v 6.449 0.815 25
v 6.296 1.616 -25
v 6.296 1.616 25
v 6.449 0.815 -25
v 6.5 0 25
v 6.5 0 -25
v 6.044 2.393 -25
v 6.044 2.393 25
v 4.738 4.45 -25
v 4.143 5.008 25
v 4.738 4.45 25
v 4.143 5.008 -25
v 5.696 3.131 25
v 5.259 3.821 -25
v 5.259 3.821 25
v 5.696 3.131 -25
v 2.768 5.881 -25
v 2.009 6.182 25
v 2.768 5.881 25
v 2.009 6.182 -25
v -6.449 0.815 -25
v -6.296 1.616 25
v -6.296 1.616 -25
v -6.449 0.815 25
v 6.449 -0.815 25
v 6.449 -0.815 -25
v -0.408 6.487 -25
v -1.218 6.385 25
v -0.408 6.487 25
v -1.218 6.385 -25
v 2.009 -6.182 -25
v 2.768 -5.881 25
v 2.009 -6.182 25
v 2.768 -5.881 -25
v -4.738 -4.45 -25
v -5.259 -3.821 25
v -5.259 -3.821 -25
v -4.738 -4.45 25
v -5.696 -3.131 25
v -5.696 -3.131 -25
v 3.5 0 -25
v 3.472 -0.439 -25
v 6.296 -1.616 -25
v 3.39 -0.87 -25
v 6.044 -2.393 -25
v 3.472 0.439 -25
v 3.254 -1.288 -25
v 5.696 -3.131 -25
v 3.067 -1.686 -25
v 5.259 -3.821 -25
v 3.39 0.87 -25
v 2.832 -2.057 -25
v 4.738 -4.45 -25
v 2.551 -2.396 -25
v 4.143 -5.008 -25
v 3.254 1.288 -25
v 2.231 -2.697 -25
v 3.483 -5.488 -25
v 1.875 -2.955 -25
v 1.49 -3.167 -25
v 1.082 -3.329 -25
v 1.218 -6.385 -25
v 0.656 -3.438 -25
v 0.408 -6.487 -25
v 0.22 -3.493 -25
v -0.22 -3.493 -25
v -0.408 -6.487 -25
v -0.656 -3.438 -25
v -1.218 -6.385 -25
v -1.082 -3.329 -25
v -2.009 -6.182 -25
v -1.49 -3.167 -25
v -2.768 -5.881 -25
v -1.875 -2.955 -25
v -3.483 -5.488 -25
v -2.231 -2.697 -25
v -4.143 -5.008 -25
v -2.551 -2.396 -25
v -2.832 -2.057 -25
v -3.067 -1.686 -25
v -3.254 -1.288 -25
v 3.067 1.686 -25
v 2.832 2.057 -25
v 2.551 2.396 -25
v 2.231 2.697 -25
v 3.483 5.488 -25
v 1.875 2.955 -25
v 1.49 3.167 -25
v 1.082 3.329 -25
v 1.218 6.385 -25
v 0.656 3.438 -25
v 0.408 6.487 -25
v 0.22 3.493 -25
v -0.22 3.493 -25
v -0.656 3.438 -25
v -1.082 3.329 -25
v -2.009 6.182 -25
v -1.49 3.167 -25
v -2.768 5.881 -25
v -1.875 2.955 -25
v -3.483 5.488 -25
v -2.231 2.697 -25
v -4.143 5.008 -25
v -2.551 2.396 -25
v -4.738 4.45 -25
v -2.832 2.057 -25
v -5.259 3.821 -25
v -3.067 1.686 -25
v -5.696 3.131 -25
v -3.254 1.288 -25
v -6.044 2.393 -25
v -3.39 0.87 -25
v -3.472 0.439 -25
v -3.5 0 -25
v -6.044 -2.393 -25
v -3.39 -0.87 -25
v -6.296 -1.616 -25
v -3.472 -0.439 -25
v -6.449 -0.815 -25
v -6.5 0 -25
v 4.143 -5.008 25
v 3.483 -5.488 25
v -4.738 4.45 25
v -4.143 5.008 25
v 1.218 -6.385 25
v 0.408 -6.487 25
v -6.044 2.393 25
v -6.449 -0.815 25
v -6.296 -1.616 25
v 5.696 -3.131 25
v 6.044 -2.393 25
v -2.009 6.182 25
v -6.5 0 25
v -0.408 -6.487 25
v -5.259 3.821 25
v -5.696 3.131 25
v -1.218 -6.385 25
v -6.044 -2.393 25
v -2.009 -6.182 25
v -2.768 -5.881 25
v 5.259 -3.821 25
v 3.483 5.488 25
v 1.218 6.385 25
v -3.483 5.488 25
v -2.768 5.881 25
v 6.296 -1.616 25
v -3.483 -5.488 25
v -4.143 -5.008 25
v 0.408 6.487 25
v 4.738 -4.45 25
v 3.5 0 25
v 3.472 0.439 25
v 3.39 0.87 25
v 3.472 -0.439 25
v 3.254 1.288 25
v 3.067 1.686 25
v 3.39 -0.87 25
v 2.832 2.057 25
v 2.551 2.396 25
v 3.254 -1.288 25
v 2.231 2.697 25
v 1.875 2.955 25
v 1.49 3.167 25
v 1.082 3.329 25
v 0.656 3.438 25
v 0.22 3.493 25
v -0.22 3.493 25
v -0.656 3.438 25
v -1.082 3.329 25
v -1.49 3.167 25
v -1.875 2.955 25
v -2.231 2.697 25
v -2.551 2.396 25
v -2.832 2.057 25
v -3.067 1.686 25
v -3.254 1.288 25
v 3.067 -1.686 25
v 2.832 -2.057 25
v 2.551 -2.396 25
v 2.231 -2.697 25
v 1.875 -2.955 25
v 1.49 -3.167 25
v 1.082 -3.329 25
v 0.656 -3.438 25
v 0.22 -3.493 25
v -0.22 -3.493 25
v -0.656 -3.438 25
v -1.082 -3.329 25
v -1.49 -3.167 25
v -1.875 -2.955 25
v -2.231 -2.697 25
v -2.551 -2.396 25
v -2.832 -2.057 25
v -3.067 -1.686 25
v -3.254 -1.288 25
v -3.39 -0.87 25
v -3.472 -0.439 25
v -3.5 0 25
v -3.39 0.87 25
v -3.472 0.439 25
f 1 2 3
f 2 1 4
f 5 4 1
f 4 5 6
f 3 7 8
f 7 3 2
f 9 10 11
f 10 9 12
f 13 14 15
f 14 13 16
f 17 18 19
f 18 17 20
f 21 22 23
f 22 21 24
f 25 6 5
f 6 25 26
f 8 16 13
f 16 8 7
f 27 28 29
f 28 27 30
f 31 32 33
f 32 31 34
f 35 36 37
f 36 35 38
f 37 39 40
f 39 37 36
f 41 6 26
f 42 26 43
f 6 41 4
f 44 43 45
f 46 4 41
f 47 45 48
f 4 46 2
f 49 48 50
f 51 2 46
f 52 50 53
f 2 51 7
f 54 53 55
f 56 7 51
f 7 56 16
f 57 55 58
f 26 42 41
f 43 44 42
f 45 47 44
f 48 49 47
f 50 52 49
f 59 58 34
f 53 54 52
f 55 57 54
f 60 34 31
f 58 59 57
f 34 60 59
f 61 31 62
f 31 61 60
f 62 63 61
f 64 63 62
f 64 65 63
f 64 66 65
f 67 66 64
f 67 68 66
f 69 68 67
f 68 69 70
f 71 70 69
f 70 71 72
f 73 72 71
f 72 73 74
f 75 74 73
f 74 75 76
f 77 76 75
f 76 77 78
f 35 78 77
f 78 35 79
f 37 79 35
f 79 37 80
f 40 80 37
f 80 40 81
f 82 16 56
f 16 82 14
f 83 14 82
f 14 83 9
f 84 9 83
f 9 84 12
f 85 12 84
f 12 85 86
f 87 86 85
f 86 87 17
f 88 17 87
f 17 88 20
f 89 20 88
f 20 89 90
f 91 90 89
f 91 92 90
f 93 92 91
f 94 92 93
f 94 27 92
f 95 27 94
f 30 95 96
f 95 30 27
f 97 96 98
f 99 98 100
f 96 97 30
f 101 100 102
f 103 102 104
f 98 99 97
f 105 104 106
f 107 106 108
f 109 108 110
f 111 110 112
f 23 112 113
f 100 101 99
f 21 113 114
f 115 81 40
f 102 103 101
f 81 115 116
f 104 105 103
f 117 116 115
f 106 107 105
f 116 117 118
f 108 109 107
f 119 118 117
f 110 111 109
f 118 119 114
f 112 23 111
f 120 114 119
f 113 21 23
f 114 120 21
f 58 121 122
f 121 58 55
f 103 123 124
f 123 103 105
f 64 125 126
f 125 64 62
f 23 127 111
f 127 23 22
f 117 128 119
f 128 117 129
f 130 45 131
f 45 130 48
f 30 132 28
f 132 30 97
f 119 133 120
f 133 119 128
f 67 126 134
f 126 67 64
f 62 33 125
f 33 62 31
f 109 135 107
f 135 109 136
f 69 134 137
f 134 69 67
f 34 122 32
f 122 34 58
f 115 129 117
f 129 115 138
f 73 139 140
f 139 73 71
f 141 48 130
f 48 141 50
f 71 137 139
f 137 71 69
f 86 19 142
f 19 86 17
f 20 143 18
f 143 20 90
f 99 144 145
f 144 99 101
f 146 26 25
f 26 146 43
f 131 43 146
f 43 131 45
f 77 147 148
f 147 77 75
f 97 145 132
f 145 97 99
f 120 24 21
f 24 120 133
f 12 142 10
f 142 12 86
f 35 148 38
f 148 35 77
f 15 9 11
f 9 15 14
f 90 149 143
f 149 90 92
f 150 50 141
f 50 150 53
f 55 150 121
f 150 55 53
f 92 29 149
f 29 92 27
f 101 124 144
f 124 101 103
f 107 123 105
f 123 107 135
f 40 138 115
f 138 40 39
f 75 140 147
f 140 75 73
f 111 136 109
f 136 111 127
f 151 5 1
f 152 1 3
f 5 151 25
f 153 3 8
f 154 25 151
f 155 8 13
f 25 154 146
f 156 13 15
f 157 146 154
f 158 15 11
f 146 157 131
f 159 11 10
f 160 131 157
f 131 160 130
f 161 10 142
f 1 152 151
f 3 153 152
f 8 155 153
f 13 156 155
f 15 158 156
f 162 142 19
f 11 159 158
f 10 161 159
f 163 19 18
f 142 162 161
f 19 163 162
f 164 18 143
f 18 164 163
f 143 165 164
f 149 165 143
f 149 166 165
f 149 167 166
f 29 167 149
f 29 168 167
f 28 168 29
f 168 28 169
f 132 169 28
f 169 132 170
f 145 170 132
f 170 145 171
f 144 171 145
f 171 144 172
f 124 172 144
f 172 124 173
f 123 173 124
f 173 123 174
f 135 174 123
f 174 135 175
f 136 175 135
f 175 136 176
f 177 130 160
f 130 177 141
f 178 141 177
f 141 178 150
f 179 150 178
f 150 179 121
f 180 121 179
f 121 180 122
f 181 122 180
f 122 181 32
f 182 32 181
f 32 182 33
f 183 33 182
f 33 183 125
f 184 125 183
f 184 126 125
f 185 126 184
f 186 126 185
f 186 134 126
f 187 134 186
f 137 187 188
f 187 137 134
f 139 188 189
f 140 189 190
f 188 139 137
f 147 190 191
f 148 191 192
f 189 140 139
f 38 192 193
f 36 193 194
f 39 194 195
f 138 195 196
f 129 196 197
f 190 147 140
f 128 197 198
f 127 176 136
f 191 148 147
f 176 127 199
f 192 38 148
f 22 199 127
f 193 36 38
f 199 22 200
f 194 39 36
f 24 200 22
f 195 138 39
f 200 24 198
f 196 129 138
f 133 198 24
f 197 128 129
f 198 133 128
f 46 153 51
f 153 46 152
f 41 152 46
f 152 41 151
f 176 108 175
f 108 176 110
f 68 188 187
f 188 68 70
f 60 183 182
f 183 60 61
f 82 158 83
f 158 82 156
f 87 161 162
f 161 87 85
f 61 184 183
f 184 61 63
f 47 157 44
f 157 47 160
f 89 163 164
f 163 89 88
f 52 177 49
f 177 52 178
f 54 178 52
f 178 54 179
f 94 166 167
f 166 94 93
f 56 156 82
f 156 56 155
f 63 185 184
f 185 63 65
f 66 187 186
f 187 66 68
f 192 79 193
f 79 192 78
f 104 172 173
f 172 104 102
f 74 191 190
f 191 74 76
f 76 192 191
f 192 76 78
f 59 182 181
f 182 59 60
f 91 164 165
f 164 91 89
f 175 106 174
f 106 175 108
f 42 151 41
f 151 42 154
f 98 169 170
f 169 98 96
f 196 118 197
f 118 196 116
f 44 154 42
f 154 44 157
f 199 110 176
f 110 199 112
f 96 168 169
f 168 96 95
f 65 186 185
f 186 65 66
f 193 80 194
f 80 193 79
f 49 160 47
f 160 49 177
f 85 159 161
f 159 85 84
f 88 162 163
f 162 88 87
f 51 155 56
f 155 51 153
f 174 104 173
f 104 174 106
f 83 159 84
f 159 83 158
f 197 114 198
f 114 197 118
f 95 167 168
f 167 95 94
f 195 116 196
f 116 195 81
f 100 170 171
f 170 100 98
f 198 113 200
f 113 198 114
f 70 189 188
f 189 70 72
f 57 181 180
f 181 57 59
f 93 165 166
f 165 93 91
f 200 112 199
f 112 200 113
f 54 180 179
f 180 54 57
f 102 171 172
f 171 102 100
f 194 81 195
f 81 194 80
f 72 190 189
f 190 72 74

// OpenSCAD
$fn = 50;


difference() {
	union() {
		translate(v = [0, 0, -25.0000000000]) {
			cylinder(h = 50, r = 6.5000000000);
		}
	}
	union() {
		translate(v = [0, 0, -100.0000000000]) {
			cylinder(h = 200, r = 3.5000000000);
		}
	}
}
